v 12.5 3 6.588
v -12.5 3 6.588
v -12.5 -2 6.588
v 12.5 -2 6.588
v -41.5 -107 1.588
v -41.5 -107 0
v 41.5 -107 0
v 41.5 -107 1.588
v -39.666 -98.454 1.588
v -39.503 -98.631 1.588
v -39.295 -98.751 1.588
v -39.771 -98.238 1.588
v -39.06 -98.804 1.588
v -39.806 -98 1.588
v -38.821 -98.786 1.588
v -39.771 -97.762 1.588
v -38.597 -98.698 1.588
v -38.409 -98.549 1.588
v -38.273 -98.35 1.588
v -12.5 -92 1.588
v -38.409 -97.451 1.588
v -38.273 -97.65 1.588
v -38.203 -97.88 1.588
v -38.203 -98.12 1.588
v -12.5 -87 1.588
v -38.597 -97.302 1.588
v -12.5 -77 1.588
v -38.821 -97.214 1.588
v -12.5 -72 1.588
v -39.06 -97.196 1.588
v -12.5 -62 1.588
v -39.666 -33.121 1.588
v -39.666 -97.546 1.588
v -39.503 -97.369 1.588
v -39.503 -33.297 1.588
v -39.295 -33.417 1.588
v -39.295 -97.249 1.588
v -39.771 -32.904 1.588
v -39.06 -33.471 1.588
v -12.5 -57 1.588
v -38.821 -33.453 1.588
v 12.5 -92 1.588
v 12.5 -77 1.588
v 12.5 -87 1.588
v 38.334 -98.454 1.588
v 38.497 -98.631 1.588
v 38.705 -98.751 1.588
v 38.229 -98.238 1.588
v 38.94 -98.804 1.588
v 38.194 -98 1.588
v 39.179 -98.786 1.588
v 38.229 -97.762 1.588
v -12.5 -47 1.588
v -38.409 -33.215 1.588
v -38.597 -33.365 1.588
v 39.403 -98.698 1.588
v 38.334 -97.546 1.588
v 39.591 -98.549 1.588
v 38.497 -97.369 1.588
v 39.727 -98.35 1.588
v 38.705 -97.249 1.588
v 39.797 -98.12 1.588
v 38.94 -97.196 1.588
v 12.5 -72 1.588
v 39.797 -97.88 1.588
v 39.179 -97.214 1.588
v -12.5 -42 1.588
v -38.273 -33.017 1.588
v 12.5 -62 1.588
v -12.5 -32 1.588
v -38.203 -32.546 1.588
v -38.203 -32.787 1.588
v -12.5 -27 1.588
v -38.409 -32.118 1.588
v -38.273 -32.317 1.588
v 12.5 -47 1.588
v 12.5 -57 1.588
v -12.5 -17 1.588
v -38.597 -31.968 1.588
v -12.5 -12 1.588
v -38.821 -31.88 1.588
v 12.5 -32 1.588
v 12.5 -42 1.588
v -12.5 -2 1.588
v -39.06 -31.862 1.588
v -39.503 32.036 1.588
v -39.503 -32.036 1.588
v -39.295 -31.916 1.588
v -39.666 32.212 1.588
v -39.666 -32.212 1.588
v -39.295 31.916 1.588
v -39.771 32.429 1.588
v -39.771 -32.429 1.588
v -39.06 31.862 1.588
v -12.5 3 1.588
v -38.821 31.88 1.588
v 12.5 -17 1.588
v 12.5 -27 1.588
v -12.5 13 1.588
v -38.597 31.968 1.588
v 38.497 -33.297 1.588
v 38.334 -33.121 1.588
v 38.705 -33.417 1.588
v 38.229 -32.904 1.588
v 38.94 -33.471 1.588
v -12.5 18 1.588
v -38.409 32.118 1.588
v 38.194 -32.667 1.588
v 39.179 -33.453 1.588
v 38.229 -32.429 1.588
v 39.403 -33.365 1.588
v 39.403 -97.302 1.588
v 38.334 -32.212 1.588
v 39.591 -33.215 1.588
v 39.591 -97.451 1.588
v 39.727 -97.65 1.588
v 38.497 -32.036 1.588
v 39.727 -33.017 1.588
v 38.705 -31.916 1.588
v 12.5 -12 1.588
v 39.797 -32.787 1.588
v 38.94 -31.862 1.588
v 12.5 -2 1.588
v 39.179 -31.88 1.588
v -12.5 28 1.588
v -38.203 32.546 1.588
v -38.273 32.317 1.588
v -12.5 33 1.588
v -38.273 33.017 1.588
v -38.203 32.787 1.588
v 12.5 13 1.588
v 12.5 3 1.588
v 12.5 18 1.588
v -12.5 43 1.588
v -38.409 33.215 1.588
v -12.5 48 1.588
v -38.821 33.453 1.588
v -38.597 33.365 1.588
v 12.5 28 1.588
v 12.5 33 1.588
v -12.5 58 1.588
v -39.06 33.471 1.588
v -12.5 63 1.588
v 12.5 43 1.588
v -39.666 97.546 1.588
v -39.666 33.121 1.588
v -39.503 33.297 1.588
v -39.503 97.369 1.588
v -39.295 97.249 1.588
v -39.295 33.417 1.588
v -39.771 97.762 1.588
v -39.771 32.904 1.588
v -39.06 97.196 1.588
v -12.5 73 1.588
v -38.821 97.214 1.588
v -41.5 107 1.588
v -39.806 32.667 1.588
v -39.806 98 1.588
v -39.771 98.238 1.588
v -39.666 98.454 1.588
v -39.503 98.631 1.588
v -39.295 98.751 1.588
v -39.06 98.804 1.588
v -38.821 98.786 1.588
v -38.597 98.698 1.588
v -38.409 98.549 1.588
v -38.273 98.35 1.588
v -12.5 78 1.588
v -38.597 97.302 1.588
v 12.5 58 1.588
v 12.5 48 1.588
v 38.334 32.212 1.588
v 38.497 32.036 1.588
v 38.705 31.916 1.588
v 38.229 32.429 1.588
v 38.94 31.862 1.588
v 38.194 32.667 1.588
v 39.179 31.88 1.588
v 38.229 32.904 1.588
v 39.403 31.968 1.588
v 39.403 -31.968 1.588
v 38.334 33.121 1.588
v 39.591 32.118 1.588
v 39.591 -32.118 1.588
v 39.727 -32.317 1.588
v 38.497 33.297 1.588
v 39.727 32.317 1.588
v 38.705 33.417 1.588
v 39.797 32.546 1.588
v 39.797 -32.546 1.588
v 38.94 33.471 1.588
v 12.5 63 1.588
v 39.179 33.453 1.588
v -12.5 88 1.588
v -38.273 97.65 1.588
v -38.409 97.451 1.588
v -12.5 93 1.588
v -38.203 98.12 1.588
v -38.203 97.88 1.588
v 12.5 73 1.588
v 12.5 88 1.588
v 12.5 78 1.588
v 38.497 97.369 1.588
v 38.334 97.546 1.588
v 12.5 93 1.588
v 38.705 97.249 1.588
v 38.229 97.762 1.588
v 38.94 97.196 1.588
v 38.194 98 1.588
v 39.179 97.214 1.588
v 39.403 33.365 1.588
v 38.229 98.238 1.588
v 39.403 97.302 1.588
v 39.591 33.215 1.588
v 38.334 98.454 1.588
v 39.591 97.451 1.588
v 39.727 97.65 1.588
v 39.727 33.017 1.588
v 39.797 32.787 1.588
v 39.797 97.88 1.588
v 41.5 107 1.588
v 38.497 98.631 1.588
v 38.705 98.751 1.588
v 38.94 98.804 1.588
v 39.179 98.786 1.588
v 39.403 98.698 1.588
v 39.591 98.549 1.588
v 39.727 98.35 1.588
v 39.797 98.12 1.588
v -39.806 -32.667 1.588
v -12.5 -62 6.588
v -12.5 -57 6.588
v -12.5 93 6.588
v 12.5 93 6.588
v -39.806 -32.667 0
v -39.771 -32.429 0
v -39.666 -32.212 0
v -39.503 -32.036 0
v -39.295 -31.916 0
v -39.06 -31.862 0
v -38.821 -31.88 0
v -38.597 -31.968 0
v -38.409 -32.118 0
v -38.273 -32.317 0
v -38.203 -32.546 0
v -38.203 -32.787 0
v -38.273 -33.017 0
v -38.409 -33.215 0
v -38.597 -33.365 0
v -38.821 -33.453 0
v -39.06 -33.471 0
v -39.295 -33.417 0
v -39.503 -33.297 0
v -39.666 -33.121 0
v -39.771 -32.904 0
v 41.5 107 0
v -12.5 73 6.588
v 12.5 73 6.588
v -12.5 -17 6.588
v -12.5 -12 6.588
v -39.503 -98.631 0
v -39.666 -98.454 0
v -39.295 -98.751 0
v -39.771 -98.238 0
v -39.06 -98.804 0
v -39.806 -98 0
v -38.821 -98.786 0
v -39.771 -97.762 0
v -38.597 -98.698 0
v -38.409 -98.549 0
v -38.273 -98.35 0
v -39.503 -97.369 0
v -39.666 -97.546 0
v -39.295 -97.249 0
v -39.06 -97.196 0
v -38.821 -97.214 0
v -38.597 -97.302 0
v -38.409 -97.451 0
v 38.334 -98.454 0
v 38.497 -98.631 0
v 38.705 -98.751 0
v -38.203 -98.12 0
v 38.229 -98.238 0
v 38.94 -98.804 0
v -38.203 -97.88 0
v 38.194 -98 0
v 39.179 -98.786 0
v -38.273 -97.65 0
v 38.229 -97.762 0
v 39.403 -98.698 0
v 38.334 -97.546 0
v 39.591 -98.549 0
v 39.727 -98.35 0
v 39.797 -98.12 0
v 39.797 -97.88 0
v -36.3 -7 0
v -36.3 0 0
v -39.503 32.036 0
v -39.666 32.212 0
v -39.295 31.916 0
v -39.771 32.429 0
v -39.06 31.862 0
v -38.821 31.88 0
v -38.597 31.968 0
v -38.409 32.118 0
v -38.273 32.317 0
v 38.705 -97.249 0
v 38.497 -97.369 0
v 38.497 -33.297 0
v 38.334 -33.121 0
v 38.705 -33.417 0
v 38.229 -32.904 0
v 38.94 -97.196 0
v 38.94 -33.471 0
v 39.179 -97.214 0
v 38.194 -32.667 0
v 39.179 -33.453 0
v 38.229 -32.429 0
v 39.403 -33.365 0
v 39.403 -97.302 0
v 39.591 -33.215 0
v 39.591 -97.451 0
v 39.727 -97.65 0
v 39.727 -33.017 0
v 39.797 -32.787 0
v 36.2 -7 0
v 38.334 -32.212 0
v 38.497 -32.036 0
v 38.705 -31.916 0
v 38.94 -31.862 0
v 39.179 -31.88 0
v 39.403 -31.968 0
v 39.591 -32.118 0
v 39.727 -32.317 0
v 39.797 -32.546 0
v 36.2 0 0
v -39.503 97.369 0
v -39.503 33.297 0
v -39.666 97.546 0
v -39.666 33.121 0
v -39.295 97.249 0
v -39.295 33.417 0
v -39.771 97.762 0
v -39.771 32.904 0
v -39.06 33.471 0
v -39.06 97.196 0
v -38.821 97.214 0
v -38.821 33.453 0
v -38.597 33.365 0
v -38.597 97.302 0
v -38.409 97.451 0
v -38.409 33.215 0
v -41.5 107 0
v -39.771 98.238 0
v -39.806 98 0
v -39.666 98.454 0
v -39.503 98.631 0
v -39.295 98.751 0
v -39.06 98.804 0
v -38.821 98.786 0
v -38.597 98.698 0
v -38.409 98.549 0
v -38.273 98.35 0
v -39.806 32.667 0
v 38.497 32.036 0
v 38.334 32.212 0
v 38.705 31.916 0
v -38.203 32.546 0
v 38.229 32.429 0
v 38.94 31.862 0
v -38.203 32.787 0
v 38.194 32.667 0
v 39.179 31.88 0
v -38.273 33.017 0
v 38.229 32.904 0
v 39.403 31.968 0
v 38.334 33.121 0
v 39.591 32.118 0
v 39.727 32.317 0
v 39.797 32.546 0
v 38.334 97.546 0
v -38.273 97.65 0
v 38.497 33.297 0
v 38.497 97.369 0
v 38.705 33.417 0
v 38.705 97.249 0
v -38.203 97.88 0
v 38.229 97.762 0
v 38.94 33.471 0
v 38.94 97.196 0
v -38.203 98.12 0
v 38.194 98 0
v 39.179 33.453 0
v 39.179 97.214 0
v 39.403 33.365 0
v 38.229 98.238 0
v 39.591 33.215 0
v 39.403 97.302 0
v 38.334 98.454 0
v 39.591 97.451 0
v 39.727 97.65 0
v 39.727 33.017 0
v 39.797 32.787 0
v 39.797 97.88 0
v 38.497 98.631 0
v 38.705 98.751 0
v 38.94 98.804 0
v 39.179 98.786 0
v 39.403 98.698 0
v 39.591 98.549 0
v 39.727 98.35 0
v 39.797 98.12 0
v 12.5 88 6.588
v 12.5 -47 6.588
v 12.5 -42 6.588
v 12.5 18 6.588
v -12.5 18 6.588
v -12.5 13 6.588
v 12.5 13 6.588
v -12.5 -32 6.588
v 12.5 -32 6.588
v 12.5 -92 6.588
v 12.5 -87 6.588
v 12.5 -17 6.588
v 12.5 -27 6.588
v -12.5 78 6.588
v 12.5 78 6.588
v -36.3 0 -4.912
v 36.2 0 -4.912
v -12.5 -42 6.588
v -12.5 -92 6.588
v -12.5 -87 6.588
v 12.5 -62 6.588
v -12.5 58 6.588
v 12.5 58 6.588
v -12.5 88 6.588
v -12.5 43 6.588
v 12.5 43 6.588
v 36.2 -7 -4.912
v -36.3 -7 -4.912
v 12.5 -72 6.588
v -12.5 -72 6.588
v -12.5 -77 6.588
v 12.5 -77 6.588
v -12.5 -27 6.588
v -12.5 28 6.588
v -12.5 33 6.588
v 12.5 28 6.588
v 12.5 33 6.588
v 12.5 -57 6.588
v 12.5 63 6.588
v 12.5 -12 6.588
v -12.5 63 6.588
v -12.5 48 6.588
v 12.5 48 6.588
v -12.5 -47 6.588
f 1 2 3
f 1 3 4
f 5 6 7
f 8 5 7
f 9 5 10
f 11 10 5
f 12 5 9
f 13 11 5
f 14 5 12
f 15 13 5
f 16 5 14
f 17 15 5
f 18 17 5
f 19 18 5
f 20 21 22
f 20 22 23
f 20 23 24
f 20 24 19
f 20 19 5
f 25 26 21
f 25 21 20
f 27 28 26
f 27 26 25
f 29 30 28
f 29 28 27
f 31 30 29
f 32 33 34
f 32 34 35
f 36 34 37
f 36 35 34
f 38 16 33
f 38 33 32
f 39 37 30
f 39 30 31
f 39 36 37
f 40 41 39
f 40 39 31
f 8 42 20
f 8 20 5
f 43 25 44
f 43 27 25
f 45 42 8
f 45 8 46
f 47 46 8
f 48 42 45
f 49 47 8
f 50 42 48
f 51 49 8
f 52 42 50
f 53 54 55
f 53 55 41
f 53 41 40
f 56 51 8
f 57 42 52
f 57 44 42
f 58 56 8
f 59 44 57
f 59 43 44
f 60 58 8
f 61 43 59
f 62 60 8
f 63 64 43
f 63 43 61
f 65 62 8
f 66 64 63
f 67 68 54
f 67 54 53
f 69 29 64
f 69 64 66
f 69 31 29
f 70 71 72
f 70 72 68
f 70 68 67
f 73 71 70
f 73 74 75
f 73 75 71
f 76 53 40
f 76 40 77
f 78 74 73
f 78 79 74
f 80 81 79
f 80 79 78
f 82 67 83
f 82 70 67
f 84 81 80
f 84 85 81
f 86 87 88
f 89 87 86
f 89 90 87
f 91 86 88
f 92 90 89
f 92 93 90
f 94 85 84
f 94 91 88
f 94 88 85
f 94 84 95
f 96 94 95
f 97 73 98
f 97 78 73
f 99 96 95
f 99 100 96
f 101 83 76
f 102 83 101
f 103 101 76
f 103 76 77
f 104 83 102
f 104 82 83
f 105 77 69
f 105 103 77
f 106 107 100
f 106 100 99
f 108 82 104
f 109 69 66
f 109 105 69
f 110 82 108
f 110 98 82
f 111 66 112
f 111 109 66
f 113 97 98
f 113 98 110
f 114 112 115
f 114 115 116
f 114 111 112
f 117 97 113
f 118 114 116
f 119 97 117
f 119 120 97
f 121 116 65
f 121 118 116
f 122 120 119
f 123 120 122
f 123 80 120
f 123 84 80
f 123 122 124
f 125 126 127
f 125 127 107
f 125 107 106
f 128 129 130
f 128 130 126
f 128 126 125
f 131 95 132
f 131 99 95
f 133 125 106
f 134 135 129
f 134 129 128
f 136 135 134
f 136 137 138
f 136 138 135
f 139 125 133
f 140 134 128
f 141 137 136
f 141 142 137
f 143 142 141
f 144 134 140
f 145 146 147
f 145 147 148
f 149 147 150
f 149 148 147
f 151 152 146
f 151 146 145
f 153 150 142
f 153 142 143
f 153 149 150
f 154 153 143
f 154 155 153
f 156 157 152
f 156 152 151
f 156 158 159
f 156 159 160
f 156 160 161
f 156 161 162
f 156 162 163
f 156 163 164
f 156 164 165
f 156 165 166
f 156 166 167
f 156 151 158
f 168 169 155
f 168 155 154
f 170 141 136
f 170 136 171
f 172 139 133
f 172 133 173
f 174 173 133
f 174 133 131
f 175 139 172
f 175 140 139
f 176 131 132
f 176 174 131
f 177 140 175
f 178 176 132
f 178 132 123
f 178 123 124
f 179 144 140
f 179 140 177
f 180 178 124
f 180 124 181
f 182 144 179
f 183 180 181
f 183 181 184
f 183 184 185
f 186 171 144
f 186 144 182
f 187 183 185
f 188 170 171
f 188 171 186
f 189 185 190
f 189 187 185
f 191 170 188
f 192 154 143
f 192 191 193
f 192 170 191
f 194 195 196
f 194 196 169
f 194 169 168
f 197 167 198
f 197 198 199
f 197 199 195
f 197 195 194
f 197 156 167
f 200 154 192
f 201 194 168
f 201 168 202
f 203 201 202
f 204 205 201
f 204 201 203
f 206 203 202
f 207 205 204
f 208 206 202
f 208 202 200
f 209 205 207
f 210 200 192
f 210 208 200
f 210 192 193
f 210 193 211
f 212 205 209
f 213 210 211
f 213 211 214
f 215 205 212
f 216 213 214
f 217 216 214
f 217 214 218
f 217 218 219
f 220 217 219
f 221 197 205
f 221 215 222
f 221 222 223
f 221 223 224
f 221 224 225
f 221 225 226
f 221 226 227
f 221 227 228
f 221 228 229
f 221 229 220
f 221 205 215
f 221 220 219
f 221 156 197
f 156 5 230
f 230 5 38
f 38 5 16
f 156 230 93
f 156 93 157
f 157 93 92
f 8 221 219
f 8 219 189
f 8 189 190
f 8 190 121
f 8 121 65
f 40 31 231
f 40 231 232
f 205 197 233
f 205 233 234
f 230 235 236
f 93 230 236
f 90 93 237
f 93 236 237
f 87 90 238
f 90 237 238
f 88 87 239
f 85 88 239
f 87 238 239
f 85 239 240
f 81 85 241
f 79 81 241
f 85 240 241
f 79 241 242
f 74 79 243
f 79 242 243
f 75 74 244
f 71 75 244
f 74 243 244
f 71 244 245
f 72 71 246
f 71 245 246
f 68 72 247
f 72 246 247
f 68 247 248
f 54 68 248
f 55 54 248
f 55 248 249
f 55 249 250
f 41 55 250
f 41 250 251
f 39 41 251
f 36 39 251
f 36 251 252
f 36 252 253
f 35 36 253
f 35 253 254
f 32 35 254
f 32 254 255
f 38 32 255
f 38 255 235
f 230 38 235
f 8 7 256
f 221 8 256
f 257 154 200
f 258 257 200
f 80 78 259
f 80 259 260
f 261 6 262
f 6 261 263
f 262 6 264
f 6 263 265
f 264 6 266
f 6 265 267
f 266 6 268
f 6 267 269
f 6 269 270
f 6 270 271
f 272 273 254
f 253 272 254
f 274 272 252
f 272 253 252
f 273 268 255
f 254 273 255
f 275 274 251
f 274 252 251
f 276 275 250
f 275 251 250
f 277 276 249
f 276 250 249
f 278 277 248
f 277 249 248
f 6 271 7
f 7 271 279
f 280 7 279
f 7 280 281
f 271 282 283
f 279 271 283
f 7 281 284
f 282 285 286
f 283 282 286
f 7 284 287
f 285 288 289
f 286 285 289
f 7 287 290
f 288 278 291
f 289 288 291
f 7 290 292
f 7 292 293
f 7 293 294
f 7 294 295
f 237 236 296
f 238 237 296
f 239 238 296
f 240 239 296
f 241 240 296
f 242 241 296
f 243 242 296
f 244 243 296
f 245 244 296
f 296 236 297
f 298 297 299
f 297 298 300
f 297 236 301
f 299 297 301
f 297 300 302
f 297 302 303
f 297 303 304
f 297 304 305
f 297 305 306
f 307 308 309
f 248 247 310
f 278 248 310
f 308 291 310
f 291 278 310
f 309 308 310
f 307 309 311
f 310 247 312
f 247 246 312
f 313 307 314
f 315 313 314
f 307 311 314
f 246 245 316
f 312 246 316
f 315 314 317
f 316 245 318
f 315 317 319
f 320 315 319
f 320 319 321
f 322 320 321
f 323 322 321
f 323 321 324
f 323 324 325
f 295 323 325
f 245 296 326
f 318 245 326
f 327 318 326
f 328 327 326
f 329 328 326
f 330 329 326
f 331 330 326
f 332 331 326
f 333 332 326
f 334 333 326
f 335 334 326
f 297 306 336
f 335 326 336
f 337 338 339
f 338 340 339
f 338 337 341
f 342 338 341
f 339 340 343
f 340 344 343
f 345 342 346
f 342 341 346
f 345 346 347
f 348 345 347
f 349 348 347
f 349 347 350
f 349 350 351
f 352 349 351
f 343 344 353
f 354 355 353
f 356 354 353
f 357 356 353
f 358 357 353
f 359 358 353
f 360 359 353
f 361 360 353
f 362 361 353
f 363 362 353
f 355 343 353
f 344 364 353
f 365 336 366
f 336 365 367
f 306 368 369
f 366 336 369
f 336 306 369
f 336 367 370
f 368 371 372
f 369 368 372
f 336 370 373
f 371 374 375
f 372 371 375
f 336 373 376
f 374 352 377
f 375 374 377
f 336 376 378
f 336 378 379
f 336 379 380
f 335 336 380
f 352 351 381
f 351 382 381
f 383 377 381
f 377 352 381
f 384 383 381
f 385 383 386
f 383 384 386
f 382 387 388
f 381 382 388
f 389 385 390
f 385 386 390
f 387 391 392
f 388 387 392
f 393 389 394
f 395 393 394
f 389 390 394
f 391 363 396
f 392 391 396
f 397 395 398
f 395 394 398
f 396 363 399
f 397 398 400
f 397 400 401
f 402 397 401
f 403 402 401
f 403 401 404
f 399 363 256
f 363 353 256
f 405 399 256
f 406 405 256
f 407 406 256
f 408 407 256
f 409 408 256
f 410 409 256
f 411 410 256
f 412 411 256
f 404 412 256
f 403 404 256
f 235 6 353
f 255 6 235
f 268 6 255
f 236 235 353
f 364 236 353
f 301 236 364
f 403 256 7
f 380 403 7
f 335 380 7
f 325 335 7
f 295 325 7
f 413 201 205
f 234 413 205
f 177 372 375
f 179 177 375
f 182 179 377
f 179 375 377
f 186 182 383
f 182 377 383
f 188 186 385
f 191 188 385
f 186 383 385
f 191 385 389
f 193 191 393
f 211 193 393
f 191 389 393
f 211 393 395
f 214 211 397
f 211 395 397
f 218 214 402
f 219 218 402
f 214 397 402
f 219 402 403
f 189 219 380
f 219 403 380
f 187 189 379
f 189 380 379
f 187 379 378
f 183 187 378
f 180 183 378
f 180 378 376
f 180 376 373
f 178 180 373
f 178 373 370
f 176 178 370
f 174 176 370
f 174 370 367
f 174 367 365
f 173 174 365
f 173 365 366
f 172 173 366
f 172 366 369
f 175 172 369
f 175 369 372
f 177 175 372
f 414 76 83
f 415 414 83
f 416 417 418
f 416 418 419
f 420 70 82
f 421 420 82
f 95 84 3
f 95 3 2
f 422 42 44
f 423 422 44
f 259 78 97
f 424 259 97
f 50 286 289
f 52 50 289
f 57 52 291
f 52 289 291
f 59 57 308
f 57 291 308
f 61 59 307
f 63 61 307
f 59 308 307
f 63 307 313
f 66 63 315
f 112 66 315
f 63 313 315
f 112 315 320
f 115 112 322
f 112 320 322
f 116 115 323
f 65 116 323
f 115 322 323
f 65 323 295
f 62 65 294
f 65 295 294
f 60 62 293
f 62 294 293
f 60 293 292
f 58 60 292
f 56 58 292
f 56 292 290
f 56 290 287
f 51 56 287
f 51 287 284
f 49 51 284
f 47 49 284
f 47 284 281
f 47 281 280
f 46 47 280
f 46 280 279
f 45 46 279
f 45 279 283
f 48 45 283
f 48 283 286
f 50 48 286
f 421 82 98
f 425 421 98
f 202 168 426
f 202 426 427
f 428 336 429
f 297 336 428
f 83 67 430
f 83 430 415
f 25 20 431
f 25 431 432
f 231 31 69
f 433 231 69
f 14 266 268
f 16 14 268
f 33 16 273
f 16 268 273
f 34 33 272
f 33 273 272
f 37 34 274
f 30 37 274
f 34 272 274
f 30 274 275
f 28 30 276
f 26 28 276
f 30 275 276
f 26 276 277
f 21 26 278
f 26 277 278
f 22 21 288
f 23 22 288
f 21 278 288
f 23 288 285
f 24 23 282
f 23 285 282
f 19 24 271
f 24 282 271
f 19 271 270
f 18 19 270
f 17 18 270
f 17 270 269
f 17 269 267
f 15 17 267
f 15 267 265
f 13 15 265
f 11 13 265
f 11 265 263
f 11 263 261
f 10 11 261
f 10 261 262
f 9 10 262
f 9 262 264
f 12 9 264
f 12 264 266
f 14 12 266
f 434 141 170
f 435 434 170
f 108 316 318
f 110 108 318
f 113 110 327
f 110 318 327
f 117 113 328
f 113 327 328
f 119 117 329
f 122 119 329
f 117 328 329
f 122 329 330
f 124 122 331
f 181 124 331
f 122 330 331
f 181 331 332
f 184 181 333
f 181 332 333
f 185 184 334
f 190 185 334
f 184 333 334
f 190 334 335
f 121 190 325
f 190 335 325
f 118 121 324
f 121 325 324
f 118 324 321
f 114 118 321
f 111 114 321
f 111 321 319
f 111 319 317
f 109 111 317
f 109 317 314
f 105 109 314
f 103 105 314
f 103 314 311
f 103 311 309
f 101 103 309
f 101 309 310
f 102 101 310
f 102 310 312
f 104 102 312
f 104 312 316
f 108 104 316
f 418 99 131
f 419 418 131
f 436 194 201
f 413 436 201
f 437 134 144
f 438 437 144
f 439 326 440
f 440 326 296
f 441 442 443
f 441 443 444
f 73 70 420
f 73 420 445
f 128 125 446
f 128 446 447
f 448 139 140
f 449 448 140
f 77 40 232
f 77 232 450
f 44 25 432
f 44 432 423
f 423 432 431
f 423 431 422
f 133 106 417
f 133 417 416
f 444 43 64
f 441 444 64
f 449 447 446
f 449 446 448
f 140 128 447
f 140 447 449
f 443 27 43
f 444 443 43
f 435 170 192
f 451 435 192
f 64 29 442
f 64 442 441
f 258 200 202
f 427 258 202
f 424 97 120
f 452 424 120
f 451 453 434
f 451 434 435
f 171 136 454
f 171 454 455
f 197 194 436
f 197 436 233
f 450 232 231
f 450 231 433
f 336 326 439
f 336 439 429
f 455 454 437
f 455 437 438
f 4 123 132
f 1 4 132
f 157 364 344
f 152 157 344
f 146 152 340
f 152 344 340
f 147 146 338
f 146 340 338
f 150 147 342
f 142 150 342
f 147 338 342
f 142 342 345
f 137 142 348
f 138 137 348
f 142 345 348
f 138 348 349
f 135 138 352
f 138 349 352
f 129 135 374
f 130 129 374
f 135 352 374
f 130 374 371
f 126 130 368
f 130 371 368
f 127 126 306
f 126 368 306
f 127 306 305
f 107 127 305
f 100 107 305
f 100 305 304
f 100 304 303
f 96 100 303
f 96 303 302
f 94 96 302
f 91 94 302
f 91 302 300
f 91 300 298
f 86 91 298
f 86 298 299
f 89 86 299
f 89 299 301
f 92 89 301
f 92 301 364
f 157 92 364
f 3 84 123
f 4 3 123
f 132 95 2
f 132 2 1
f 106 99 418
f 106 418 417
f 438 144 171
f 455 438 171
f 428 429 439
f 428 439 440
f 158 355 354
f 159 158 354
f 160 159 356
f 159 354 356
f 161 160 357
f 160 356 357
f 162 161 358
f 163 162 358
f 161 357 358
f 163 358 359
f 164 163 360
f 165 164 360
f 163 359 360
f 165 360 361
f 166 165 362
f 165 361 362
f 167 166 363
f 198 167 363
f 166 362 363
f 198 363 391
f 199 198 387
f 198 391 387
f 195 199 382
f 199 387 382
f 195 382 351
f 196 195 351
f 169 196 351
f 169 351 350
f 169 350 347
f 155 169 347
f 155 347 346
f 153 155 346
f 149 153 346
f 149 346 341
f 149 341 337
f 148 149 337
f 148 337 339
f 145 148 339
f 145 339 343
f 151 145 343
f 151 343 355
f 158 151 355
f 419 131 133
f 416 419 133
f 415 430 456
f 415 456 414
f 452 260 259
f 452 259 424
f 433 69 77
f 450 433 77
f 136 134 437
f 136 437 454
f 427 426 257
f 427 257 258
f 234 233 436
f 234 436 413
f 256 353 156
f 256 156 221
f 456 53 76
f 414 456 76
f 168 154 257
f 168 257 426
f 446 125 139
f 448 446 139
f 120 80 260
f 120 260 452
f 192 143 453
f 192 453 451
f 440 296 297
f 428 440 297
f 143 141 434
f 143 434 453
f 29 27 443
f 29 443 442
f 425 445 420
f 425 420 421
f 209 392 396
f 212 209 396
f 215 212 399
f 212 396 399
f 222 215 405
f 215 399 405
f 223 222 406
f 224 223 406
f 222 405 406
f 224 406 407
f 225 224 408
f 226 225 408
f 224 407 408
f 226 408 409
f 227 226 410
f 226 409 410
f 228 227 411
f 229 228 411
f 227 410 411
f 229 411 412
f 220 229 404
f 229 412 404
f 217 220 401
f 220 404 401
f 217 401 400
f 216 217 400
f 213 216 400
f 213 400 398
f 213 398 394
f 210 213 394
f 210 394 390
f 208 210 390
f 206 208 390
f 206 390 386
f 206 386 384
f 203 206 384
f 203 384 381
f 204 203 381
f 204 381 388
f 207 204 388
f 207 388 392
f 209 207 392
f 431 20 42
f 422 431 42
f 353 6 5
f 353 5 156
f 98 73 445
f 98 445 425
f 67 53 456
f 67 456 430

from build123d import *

# Parameters (mm, degrees)
SKETCH1_W                 = 83
SKETCH1_H                 = 214
BOSS_EXTRUDE1_DEPTH       = 1.5875
SKETCH2_W                 = 25
SKETCH2_H                 = 5
BOSS_EXTRUDE2_DEPTH       = 5
F_0_CLEARANCE_HOLE1_D     = 1.6129
F_0_CLEARANCE_HOLE1_DEPTH = 3.175
F_0_CLEARANCE_HOLE1_TIP   = 0.484564046
SKETCH6_W                 = 72.5
SKETCH6_H                 = 7
BOSS_EXTRUDE3_DEPTH       = 4.9125


with BuildPart() as part:
    # Sketch1 → Boss-Extrude1 (new body)
    with BuildSketch(Plane.XY):
        Rectangle(SKETCH1_W, SKETCH1_H)
    extrude(amount=BOSS_EXTRUDE1_DEPTH)

    # Sketch2 → Boss-Extrude2 (add)
    with BuildSketch(Plane.XY.offset(1.5875)):
        with Locations((0, 90.5)):
            Rectangle(SKETCH2_W, SKETCH2_H)
        with Locations((0, 75.5)):
            Rectangle(SKETCH2_W, SKETCH2_H)
        with Locations((0, 60.5)):
            Rectangle(SKETCH2_W, SKETCH2_H)
        with Locations((0, 45.5)):
            Rectangle(SKETCH2_W, SKETCH2_H)
        with Locations((0, 30.5)):
            Rectangle(SKETCH2_W, SKETCH2_H)
        with Locations((0, 15.5)):
            Rectangle(SKETCH2_W, SKETCH2_H)
        with Locations((0, 0.5)):
            Rectangle(SKETCH2_W, SKETCH2_H)
        with Locations((0, -14.5)):
            Rectangle(SKETCH2_W, SKETCH2_H)
        with Locations((0, -29.5)):
            Rectangle(SKETCH2_W, SKETCH2_H)
        with Locations((0, -44.5)):
            Rectangle(SKETCH2_W, SKETCH2_H)
        with Locations((0, -59.5)):
            Rectangle(SKETCH2_W, SKETCH2_H)
        with Locations((0, -74.5)):
            Rectangle(SKETCH2_W, SKETCH2_H)
        with Locations((0, -89.5)):
            Rectangle(SKETCH2_W, SKETCH2_H)
    extrude(amount=BOSS_EXTRUDE2_DEPTH)

    # #0 Clearance Hole1
    with Locations(Plane.XY.offset(1.5875)):
        with Locations((-39, 98), (39, 98), (-39, 32.666666667), (39, 32.666666667), (-39, -32.666666667), (39, -32.666666667), (-39, -98), (39, -98)):
            Hole(F_0_CLEARANCE_HOLE1_D / 2, depth=F_0_CLEARANCE_HOLE1_DEPTH)
            with Locations((0, 0, -(F_0_CLEARANCE_HOLE1_DEPTH + F_0_CLEARANCE_HOLE1_TIP / 2))):  # 118° drill point
                Cone(0, F_0_CLEARANCE_HOLE1_D / 2, F_0_CLEARANCE_HOLE1_TIP, mode=Mode.SUBTRACT)

    # Sketch6 → Boss-Extrude3 (add)
    with BuildSketch(Plane(origin=(0, 0, 0), x_dir=(-1, 0, 0), z_dir=(0, 0, -1))):
        with Locations((0.05, -3.5)):
            Rectangle(SKETCH6_W, SKETCH6_H)
    extrude(amount=BOSS_EXTRUDE3_DEPTH)


solid = part.part
